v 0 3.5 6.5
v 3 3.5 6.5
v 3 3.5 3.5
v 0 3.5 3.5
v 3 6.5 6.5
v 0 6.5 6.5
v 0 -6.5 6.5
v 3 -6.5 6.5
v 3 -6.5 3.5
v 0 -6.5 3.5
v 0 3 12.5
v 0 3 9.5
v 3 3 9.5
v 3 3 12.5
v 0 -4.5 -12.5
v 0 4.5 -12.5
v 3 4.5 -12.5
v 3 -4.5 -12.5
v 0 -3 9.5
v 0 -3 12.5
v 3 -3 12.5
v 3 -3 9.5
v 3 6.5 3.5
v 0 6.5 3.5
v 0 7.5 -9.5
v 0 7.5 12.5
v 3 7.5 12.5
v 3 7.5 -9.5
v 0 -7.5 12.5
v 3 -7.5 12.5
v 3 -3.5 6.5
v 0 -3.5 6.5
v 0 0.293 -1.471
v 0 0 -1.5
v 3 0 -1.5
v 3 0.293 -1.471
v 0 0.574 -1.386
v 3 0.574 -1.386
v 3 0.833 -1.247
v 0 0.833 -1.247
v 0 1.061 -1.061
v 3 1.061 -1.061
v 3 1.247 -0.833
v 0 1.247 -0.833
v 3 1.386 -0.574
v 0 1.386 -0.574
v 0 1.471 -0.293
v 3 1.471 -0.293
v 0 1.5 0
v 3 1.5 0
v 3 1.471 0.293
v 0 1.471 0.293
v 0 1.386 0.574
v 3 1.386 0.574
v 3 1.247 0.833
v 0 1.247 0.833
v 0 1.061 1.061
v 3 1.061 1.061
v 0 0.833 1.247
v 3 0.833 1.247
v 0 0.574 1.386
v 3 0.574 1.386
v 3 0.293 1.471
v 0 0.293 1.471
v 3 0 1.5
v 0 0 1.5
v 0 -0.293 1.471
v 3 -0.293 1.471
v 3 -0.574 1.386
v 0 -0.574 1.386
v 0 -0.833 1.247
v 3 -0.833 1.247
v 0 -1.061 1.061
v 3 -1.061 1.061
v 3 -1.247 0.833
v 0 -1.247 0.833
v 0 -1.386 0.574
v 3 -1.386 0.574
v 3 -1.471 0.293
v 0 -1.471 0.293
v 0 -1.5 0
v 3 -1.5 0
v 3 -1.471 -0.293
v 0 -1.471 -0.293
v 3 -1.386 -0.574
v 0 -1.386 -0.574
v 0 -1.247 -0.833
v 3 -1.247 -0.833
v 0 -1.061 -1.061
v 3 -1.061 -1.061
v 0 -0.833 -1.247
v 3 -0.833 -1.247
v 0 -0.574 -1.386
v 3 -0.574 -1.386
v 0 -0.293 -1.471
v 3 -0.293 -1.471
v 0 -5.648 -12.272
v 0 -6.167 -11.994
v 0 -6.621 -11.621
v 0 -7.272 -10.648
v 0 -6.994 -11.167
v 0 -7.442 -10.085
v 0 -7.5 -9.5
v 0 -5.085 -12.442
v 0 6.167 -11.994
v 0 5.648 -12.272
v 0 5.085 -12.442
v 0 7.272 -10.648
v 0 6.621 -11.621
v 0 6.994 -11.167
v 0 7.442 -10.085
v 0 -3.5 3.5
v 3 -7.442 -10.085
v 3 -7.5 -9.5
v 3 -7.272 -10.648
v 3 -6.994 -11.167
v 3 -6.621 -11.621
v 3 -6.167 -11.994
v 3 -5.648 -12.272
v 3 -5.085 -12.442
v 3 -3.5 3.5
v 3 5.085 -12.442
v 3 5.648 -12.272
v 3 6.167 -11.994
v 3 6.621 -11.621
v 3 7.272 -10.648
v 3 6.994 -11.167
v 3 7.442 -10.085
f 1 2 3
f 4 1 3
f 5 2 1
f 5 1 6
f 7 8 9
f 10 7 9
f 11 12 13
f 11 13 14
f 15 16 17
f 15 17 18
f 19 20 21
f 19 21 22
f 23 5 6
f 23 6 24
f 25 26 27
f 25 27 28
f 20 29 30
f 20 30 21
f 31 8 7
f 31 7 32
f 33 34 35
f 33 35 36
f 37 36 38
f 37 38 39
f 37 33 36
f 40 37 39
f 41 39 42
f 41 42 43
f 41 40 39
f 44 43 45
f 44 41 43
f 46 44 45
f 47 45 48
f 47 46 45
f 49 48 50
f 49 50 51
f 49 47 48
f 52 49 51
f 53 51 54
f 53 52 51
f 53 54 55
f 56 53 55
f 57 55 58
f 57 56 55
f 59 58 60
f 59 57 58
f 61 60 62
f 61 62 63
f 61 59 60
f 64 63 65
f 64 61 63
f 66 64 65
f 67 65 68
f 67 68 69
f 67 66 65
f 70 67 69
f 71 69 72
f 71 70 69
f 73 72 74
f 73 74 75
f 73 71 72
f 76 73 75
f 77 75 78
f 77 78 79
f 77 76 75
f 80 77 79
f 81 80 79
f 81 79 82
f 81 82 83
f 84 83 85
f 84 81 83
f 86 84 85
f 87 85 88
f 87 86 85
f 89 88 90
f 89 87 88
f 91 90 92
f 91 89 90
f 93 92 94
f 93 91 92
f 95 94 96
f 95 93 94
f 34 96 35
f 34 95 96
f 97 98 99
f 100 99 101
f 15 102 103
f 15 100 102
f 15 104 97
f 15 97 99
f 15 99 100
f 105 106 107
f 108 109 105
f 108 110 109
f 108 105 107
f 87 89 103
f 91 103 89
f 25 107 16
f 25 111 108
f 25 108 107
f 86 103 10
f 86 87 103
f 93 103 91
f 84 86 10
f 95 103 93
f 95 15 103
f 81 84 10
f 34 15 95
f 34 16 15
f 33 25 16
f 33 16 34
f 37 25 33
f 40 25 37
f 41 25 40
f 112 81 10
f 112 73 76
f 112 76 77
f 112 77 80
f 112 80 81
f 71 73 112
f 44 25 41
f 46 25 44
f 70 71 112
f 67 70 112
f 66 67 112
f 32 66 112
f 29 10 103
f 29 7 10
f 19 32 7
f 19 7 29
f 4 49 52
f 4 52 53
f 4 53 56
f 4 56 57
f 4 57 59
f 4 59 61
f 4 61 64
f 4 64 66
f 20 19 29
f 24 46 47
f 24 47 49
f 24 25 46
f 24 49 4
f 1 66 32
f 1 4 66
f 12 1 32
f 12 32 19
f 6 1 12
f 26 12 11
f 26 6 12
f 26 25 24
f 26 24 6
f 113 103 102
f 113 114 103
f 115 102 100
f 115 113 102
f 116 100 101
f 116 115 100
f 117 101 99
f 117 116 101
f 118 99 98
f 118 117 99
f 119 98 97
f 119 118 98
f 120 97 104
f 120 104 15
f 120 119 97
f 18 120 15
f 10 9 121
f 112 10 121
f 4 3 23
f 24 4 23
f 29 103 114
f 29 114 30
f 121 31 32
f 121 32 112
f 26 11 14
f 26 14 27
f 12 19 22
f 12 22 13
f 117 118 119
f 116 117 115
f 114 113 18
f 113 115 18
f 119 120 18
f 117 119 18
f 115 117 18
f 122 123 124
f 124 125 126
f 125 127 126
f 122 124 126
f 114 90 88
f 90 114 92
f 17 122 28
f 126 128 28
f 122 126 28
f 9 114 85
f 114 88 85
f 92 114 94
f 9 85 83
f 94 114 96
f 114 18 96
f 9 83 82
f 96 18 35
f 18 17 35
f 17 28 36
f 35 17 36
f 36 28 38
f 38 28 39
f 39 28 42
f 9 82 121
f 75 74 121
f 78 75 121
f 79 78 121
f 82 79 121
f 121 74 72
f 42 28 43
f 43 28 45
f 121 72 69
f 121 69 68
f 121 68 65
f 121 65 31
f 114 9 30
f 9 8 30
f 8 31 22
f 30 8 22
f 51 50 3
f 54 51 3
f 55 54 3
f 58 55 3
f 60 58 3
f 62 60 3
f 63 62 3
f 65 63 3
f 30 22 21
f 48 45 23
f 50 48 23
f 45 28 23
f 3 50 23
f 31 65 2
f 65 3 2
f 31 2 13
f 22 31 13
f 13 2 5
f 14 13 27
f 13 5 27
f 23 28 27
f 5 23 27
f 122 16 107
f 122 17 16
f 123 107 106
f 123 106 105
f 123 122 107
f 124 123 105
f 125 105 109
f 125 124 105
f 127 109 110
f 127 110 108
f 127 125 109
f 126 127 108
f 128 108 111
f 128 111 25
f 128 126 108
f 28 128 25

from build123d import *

# Parameters (mm, degrees)
SKETCH1_R           = 1.5
BOSS_EXTRUDE1_DEPTH = 3
SKETCH2_W           = 3
SKETCH2_H           = 3
CUT_EXTRUDE1_DEPTH  = 3
FILLET1_R           = 3


with BuildPart() as part:
    # Sketch1 → Boss-Extrude1 (new body)
    with BuildSketch(Plane(origin=(0, 0, 0), x_dir=(0, 0, -1), z_dir=(1, 0, 0))):
        Polygon((-12.5, -7.5), (-12.5, -3), (-9.5, -3), (-9.5, 3), (-12.5, 3), (-12.5, 7.5), (12.5, 7.5), (12.5, -7.5), align=None)
        Circle(SKETCH1_R, mode=Mode.SUBTRACT)
    extrude(amount=BOSS_EXTRUDE1_DEPTH)

    # Sketch2 → Cut-Extrude1 (cut)
    with BuildSketch(Plane(origin=(3, 0, 0), x_dir=(0, 0, -1), z_dir=(1, 0, 0))):
        with Locations((-5, 5)):
            Rectangle(SKETCH2_W, SKETCH2_H)
        with Locations((-5, -5)):
            Rectangle(SKETCH2_W, SKETCH2_H)
    extrude(amount=-CUT_EXTRUDE1_DEPTH, mode=Mode.SUBTRACT)

    # Fillet1
    fillet1_edges = [part.edges().sort_by_distance(p)[0] for p in [
        (1.5, -7.5, -12.5),
        (1.5, 7.5, -12.5),
    ]]
    fillet(fillet1_edges, radius=FILLET1_R)


solid = part.part
